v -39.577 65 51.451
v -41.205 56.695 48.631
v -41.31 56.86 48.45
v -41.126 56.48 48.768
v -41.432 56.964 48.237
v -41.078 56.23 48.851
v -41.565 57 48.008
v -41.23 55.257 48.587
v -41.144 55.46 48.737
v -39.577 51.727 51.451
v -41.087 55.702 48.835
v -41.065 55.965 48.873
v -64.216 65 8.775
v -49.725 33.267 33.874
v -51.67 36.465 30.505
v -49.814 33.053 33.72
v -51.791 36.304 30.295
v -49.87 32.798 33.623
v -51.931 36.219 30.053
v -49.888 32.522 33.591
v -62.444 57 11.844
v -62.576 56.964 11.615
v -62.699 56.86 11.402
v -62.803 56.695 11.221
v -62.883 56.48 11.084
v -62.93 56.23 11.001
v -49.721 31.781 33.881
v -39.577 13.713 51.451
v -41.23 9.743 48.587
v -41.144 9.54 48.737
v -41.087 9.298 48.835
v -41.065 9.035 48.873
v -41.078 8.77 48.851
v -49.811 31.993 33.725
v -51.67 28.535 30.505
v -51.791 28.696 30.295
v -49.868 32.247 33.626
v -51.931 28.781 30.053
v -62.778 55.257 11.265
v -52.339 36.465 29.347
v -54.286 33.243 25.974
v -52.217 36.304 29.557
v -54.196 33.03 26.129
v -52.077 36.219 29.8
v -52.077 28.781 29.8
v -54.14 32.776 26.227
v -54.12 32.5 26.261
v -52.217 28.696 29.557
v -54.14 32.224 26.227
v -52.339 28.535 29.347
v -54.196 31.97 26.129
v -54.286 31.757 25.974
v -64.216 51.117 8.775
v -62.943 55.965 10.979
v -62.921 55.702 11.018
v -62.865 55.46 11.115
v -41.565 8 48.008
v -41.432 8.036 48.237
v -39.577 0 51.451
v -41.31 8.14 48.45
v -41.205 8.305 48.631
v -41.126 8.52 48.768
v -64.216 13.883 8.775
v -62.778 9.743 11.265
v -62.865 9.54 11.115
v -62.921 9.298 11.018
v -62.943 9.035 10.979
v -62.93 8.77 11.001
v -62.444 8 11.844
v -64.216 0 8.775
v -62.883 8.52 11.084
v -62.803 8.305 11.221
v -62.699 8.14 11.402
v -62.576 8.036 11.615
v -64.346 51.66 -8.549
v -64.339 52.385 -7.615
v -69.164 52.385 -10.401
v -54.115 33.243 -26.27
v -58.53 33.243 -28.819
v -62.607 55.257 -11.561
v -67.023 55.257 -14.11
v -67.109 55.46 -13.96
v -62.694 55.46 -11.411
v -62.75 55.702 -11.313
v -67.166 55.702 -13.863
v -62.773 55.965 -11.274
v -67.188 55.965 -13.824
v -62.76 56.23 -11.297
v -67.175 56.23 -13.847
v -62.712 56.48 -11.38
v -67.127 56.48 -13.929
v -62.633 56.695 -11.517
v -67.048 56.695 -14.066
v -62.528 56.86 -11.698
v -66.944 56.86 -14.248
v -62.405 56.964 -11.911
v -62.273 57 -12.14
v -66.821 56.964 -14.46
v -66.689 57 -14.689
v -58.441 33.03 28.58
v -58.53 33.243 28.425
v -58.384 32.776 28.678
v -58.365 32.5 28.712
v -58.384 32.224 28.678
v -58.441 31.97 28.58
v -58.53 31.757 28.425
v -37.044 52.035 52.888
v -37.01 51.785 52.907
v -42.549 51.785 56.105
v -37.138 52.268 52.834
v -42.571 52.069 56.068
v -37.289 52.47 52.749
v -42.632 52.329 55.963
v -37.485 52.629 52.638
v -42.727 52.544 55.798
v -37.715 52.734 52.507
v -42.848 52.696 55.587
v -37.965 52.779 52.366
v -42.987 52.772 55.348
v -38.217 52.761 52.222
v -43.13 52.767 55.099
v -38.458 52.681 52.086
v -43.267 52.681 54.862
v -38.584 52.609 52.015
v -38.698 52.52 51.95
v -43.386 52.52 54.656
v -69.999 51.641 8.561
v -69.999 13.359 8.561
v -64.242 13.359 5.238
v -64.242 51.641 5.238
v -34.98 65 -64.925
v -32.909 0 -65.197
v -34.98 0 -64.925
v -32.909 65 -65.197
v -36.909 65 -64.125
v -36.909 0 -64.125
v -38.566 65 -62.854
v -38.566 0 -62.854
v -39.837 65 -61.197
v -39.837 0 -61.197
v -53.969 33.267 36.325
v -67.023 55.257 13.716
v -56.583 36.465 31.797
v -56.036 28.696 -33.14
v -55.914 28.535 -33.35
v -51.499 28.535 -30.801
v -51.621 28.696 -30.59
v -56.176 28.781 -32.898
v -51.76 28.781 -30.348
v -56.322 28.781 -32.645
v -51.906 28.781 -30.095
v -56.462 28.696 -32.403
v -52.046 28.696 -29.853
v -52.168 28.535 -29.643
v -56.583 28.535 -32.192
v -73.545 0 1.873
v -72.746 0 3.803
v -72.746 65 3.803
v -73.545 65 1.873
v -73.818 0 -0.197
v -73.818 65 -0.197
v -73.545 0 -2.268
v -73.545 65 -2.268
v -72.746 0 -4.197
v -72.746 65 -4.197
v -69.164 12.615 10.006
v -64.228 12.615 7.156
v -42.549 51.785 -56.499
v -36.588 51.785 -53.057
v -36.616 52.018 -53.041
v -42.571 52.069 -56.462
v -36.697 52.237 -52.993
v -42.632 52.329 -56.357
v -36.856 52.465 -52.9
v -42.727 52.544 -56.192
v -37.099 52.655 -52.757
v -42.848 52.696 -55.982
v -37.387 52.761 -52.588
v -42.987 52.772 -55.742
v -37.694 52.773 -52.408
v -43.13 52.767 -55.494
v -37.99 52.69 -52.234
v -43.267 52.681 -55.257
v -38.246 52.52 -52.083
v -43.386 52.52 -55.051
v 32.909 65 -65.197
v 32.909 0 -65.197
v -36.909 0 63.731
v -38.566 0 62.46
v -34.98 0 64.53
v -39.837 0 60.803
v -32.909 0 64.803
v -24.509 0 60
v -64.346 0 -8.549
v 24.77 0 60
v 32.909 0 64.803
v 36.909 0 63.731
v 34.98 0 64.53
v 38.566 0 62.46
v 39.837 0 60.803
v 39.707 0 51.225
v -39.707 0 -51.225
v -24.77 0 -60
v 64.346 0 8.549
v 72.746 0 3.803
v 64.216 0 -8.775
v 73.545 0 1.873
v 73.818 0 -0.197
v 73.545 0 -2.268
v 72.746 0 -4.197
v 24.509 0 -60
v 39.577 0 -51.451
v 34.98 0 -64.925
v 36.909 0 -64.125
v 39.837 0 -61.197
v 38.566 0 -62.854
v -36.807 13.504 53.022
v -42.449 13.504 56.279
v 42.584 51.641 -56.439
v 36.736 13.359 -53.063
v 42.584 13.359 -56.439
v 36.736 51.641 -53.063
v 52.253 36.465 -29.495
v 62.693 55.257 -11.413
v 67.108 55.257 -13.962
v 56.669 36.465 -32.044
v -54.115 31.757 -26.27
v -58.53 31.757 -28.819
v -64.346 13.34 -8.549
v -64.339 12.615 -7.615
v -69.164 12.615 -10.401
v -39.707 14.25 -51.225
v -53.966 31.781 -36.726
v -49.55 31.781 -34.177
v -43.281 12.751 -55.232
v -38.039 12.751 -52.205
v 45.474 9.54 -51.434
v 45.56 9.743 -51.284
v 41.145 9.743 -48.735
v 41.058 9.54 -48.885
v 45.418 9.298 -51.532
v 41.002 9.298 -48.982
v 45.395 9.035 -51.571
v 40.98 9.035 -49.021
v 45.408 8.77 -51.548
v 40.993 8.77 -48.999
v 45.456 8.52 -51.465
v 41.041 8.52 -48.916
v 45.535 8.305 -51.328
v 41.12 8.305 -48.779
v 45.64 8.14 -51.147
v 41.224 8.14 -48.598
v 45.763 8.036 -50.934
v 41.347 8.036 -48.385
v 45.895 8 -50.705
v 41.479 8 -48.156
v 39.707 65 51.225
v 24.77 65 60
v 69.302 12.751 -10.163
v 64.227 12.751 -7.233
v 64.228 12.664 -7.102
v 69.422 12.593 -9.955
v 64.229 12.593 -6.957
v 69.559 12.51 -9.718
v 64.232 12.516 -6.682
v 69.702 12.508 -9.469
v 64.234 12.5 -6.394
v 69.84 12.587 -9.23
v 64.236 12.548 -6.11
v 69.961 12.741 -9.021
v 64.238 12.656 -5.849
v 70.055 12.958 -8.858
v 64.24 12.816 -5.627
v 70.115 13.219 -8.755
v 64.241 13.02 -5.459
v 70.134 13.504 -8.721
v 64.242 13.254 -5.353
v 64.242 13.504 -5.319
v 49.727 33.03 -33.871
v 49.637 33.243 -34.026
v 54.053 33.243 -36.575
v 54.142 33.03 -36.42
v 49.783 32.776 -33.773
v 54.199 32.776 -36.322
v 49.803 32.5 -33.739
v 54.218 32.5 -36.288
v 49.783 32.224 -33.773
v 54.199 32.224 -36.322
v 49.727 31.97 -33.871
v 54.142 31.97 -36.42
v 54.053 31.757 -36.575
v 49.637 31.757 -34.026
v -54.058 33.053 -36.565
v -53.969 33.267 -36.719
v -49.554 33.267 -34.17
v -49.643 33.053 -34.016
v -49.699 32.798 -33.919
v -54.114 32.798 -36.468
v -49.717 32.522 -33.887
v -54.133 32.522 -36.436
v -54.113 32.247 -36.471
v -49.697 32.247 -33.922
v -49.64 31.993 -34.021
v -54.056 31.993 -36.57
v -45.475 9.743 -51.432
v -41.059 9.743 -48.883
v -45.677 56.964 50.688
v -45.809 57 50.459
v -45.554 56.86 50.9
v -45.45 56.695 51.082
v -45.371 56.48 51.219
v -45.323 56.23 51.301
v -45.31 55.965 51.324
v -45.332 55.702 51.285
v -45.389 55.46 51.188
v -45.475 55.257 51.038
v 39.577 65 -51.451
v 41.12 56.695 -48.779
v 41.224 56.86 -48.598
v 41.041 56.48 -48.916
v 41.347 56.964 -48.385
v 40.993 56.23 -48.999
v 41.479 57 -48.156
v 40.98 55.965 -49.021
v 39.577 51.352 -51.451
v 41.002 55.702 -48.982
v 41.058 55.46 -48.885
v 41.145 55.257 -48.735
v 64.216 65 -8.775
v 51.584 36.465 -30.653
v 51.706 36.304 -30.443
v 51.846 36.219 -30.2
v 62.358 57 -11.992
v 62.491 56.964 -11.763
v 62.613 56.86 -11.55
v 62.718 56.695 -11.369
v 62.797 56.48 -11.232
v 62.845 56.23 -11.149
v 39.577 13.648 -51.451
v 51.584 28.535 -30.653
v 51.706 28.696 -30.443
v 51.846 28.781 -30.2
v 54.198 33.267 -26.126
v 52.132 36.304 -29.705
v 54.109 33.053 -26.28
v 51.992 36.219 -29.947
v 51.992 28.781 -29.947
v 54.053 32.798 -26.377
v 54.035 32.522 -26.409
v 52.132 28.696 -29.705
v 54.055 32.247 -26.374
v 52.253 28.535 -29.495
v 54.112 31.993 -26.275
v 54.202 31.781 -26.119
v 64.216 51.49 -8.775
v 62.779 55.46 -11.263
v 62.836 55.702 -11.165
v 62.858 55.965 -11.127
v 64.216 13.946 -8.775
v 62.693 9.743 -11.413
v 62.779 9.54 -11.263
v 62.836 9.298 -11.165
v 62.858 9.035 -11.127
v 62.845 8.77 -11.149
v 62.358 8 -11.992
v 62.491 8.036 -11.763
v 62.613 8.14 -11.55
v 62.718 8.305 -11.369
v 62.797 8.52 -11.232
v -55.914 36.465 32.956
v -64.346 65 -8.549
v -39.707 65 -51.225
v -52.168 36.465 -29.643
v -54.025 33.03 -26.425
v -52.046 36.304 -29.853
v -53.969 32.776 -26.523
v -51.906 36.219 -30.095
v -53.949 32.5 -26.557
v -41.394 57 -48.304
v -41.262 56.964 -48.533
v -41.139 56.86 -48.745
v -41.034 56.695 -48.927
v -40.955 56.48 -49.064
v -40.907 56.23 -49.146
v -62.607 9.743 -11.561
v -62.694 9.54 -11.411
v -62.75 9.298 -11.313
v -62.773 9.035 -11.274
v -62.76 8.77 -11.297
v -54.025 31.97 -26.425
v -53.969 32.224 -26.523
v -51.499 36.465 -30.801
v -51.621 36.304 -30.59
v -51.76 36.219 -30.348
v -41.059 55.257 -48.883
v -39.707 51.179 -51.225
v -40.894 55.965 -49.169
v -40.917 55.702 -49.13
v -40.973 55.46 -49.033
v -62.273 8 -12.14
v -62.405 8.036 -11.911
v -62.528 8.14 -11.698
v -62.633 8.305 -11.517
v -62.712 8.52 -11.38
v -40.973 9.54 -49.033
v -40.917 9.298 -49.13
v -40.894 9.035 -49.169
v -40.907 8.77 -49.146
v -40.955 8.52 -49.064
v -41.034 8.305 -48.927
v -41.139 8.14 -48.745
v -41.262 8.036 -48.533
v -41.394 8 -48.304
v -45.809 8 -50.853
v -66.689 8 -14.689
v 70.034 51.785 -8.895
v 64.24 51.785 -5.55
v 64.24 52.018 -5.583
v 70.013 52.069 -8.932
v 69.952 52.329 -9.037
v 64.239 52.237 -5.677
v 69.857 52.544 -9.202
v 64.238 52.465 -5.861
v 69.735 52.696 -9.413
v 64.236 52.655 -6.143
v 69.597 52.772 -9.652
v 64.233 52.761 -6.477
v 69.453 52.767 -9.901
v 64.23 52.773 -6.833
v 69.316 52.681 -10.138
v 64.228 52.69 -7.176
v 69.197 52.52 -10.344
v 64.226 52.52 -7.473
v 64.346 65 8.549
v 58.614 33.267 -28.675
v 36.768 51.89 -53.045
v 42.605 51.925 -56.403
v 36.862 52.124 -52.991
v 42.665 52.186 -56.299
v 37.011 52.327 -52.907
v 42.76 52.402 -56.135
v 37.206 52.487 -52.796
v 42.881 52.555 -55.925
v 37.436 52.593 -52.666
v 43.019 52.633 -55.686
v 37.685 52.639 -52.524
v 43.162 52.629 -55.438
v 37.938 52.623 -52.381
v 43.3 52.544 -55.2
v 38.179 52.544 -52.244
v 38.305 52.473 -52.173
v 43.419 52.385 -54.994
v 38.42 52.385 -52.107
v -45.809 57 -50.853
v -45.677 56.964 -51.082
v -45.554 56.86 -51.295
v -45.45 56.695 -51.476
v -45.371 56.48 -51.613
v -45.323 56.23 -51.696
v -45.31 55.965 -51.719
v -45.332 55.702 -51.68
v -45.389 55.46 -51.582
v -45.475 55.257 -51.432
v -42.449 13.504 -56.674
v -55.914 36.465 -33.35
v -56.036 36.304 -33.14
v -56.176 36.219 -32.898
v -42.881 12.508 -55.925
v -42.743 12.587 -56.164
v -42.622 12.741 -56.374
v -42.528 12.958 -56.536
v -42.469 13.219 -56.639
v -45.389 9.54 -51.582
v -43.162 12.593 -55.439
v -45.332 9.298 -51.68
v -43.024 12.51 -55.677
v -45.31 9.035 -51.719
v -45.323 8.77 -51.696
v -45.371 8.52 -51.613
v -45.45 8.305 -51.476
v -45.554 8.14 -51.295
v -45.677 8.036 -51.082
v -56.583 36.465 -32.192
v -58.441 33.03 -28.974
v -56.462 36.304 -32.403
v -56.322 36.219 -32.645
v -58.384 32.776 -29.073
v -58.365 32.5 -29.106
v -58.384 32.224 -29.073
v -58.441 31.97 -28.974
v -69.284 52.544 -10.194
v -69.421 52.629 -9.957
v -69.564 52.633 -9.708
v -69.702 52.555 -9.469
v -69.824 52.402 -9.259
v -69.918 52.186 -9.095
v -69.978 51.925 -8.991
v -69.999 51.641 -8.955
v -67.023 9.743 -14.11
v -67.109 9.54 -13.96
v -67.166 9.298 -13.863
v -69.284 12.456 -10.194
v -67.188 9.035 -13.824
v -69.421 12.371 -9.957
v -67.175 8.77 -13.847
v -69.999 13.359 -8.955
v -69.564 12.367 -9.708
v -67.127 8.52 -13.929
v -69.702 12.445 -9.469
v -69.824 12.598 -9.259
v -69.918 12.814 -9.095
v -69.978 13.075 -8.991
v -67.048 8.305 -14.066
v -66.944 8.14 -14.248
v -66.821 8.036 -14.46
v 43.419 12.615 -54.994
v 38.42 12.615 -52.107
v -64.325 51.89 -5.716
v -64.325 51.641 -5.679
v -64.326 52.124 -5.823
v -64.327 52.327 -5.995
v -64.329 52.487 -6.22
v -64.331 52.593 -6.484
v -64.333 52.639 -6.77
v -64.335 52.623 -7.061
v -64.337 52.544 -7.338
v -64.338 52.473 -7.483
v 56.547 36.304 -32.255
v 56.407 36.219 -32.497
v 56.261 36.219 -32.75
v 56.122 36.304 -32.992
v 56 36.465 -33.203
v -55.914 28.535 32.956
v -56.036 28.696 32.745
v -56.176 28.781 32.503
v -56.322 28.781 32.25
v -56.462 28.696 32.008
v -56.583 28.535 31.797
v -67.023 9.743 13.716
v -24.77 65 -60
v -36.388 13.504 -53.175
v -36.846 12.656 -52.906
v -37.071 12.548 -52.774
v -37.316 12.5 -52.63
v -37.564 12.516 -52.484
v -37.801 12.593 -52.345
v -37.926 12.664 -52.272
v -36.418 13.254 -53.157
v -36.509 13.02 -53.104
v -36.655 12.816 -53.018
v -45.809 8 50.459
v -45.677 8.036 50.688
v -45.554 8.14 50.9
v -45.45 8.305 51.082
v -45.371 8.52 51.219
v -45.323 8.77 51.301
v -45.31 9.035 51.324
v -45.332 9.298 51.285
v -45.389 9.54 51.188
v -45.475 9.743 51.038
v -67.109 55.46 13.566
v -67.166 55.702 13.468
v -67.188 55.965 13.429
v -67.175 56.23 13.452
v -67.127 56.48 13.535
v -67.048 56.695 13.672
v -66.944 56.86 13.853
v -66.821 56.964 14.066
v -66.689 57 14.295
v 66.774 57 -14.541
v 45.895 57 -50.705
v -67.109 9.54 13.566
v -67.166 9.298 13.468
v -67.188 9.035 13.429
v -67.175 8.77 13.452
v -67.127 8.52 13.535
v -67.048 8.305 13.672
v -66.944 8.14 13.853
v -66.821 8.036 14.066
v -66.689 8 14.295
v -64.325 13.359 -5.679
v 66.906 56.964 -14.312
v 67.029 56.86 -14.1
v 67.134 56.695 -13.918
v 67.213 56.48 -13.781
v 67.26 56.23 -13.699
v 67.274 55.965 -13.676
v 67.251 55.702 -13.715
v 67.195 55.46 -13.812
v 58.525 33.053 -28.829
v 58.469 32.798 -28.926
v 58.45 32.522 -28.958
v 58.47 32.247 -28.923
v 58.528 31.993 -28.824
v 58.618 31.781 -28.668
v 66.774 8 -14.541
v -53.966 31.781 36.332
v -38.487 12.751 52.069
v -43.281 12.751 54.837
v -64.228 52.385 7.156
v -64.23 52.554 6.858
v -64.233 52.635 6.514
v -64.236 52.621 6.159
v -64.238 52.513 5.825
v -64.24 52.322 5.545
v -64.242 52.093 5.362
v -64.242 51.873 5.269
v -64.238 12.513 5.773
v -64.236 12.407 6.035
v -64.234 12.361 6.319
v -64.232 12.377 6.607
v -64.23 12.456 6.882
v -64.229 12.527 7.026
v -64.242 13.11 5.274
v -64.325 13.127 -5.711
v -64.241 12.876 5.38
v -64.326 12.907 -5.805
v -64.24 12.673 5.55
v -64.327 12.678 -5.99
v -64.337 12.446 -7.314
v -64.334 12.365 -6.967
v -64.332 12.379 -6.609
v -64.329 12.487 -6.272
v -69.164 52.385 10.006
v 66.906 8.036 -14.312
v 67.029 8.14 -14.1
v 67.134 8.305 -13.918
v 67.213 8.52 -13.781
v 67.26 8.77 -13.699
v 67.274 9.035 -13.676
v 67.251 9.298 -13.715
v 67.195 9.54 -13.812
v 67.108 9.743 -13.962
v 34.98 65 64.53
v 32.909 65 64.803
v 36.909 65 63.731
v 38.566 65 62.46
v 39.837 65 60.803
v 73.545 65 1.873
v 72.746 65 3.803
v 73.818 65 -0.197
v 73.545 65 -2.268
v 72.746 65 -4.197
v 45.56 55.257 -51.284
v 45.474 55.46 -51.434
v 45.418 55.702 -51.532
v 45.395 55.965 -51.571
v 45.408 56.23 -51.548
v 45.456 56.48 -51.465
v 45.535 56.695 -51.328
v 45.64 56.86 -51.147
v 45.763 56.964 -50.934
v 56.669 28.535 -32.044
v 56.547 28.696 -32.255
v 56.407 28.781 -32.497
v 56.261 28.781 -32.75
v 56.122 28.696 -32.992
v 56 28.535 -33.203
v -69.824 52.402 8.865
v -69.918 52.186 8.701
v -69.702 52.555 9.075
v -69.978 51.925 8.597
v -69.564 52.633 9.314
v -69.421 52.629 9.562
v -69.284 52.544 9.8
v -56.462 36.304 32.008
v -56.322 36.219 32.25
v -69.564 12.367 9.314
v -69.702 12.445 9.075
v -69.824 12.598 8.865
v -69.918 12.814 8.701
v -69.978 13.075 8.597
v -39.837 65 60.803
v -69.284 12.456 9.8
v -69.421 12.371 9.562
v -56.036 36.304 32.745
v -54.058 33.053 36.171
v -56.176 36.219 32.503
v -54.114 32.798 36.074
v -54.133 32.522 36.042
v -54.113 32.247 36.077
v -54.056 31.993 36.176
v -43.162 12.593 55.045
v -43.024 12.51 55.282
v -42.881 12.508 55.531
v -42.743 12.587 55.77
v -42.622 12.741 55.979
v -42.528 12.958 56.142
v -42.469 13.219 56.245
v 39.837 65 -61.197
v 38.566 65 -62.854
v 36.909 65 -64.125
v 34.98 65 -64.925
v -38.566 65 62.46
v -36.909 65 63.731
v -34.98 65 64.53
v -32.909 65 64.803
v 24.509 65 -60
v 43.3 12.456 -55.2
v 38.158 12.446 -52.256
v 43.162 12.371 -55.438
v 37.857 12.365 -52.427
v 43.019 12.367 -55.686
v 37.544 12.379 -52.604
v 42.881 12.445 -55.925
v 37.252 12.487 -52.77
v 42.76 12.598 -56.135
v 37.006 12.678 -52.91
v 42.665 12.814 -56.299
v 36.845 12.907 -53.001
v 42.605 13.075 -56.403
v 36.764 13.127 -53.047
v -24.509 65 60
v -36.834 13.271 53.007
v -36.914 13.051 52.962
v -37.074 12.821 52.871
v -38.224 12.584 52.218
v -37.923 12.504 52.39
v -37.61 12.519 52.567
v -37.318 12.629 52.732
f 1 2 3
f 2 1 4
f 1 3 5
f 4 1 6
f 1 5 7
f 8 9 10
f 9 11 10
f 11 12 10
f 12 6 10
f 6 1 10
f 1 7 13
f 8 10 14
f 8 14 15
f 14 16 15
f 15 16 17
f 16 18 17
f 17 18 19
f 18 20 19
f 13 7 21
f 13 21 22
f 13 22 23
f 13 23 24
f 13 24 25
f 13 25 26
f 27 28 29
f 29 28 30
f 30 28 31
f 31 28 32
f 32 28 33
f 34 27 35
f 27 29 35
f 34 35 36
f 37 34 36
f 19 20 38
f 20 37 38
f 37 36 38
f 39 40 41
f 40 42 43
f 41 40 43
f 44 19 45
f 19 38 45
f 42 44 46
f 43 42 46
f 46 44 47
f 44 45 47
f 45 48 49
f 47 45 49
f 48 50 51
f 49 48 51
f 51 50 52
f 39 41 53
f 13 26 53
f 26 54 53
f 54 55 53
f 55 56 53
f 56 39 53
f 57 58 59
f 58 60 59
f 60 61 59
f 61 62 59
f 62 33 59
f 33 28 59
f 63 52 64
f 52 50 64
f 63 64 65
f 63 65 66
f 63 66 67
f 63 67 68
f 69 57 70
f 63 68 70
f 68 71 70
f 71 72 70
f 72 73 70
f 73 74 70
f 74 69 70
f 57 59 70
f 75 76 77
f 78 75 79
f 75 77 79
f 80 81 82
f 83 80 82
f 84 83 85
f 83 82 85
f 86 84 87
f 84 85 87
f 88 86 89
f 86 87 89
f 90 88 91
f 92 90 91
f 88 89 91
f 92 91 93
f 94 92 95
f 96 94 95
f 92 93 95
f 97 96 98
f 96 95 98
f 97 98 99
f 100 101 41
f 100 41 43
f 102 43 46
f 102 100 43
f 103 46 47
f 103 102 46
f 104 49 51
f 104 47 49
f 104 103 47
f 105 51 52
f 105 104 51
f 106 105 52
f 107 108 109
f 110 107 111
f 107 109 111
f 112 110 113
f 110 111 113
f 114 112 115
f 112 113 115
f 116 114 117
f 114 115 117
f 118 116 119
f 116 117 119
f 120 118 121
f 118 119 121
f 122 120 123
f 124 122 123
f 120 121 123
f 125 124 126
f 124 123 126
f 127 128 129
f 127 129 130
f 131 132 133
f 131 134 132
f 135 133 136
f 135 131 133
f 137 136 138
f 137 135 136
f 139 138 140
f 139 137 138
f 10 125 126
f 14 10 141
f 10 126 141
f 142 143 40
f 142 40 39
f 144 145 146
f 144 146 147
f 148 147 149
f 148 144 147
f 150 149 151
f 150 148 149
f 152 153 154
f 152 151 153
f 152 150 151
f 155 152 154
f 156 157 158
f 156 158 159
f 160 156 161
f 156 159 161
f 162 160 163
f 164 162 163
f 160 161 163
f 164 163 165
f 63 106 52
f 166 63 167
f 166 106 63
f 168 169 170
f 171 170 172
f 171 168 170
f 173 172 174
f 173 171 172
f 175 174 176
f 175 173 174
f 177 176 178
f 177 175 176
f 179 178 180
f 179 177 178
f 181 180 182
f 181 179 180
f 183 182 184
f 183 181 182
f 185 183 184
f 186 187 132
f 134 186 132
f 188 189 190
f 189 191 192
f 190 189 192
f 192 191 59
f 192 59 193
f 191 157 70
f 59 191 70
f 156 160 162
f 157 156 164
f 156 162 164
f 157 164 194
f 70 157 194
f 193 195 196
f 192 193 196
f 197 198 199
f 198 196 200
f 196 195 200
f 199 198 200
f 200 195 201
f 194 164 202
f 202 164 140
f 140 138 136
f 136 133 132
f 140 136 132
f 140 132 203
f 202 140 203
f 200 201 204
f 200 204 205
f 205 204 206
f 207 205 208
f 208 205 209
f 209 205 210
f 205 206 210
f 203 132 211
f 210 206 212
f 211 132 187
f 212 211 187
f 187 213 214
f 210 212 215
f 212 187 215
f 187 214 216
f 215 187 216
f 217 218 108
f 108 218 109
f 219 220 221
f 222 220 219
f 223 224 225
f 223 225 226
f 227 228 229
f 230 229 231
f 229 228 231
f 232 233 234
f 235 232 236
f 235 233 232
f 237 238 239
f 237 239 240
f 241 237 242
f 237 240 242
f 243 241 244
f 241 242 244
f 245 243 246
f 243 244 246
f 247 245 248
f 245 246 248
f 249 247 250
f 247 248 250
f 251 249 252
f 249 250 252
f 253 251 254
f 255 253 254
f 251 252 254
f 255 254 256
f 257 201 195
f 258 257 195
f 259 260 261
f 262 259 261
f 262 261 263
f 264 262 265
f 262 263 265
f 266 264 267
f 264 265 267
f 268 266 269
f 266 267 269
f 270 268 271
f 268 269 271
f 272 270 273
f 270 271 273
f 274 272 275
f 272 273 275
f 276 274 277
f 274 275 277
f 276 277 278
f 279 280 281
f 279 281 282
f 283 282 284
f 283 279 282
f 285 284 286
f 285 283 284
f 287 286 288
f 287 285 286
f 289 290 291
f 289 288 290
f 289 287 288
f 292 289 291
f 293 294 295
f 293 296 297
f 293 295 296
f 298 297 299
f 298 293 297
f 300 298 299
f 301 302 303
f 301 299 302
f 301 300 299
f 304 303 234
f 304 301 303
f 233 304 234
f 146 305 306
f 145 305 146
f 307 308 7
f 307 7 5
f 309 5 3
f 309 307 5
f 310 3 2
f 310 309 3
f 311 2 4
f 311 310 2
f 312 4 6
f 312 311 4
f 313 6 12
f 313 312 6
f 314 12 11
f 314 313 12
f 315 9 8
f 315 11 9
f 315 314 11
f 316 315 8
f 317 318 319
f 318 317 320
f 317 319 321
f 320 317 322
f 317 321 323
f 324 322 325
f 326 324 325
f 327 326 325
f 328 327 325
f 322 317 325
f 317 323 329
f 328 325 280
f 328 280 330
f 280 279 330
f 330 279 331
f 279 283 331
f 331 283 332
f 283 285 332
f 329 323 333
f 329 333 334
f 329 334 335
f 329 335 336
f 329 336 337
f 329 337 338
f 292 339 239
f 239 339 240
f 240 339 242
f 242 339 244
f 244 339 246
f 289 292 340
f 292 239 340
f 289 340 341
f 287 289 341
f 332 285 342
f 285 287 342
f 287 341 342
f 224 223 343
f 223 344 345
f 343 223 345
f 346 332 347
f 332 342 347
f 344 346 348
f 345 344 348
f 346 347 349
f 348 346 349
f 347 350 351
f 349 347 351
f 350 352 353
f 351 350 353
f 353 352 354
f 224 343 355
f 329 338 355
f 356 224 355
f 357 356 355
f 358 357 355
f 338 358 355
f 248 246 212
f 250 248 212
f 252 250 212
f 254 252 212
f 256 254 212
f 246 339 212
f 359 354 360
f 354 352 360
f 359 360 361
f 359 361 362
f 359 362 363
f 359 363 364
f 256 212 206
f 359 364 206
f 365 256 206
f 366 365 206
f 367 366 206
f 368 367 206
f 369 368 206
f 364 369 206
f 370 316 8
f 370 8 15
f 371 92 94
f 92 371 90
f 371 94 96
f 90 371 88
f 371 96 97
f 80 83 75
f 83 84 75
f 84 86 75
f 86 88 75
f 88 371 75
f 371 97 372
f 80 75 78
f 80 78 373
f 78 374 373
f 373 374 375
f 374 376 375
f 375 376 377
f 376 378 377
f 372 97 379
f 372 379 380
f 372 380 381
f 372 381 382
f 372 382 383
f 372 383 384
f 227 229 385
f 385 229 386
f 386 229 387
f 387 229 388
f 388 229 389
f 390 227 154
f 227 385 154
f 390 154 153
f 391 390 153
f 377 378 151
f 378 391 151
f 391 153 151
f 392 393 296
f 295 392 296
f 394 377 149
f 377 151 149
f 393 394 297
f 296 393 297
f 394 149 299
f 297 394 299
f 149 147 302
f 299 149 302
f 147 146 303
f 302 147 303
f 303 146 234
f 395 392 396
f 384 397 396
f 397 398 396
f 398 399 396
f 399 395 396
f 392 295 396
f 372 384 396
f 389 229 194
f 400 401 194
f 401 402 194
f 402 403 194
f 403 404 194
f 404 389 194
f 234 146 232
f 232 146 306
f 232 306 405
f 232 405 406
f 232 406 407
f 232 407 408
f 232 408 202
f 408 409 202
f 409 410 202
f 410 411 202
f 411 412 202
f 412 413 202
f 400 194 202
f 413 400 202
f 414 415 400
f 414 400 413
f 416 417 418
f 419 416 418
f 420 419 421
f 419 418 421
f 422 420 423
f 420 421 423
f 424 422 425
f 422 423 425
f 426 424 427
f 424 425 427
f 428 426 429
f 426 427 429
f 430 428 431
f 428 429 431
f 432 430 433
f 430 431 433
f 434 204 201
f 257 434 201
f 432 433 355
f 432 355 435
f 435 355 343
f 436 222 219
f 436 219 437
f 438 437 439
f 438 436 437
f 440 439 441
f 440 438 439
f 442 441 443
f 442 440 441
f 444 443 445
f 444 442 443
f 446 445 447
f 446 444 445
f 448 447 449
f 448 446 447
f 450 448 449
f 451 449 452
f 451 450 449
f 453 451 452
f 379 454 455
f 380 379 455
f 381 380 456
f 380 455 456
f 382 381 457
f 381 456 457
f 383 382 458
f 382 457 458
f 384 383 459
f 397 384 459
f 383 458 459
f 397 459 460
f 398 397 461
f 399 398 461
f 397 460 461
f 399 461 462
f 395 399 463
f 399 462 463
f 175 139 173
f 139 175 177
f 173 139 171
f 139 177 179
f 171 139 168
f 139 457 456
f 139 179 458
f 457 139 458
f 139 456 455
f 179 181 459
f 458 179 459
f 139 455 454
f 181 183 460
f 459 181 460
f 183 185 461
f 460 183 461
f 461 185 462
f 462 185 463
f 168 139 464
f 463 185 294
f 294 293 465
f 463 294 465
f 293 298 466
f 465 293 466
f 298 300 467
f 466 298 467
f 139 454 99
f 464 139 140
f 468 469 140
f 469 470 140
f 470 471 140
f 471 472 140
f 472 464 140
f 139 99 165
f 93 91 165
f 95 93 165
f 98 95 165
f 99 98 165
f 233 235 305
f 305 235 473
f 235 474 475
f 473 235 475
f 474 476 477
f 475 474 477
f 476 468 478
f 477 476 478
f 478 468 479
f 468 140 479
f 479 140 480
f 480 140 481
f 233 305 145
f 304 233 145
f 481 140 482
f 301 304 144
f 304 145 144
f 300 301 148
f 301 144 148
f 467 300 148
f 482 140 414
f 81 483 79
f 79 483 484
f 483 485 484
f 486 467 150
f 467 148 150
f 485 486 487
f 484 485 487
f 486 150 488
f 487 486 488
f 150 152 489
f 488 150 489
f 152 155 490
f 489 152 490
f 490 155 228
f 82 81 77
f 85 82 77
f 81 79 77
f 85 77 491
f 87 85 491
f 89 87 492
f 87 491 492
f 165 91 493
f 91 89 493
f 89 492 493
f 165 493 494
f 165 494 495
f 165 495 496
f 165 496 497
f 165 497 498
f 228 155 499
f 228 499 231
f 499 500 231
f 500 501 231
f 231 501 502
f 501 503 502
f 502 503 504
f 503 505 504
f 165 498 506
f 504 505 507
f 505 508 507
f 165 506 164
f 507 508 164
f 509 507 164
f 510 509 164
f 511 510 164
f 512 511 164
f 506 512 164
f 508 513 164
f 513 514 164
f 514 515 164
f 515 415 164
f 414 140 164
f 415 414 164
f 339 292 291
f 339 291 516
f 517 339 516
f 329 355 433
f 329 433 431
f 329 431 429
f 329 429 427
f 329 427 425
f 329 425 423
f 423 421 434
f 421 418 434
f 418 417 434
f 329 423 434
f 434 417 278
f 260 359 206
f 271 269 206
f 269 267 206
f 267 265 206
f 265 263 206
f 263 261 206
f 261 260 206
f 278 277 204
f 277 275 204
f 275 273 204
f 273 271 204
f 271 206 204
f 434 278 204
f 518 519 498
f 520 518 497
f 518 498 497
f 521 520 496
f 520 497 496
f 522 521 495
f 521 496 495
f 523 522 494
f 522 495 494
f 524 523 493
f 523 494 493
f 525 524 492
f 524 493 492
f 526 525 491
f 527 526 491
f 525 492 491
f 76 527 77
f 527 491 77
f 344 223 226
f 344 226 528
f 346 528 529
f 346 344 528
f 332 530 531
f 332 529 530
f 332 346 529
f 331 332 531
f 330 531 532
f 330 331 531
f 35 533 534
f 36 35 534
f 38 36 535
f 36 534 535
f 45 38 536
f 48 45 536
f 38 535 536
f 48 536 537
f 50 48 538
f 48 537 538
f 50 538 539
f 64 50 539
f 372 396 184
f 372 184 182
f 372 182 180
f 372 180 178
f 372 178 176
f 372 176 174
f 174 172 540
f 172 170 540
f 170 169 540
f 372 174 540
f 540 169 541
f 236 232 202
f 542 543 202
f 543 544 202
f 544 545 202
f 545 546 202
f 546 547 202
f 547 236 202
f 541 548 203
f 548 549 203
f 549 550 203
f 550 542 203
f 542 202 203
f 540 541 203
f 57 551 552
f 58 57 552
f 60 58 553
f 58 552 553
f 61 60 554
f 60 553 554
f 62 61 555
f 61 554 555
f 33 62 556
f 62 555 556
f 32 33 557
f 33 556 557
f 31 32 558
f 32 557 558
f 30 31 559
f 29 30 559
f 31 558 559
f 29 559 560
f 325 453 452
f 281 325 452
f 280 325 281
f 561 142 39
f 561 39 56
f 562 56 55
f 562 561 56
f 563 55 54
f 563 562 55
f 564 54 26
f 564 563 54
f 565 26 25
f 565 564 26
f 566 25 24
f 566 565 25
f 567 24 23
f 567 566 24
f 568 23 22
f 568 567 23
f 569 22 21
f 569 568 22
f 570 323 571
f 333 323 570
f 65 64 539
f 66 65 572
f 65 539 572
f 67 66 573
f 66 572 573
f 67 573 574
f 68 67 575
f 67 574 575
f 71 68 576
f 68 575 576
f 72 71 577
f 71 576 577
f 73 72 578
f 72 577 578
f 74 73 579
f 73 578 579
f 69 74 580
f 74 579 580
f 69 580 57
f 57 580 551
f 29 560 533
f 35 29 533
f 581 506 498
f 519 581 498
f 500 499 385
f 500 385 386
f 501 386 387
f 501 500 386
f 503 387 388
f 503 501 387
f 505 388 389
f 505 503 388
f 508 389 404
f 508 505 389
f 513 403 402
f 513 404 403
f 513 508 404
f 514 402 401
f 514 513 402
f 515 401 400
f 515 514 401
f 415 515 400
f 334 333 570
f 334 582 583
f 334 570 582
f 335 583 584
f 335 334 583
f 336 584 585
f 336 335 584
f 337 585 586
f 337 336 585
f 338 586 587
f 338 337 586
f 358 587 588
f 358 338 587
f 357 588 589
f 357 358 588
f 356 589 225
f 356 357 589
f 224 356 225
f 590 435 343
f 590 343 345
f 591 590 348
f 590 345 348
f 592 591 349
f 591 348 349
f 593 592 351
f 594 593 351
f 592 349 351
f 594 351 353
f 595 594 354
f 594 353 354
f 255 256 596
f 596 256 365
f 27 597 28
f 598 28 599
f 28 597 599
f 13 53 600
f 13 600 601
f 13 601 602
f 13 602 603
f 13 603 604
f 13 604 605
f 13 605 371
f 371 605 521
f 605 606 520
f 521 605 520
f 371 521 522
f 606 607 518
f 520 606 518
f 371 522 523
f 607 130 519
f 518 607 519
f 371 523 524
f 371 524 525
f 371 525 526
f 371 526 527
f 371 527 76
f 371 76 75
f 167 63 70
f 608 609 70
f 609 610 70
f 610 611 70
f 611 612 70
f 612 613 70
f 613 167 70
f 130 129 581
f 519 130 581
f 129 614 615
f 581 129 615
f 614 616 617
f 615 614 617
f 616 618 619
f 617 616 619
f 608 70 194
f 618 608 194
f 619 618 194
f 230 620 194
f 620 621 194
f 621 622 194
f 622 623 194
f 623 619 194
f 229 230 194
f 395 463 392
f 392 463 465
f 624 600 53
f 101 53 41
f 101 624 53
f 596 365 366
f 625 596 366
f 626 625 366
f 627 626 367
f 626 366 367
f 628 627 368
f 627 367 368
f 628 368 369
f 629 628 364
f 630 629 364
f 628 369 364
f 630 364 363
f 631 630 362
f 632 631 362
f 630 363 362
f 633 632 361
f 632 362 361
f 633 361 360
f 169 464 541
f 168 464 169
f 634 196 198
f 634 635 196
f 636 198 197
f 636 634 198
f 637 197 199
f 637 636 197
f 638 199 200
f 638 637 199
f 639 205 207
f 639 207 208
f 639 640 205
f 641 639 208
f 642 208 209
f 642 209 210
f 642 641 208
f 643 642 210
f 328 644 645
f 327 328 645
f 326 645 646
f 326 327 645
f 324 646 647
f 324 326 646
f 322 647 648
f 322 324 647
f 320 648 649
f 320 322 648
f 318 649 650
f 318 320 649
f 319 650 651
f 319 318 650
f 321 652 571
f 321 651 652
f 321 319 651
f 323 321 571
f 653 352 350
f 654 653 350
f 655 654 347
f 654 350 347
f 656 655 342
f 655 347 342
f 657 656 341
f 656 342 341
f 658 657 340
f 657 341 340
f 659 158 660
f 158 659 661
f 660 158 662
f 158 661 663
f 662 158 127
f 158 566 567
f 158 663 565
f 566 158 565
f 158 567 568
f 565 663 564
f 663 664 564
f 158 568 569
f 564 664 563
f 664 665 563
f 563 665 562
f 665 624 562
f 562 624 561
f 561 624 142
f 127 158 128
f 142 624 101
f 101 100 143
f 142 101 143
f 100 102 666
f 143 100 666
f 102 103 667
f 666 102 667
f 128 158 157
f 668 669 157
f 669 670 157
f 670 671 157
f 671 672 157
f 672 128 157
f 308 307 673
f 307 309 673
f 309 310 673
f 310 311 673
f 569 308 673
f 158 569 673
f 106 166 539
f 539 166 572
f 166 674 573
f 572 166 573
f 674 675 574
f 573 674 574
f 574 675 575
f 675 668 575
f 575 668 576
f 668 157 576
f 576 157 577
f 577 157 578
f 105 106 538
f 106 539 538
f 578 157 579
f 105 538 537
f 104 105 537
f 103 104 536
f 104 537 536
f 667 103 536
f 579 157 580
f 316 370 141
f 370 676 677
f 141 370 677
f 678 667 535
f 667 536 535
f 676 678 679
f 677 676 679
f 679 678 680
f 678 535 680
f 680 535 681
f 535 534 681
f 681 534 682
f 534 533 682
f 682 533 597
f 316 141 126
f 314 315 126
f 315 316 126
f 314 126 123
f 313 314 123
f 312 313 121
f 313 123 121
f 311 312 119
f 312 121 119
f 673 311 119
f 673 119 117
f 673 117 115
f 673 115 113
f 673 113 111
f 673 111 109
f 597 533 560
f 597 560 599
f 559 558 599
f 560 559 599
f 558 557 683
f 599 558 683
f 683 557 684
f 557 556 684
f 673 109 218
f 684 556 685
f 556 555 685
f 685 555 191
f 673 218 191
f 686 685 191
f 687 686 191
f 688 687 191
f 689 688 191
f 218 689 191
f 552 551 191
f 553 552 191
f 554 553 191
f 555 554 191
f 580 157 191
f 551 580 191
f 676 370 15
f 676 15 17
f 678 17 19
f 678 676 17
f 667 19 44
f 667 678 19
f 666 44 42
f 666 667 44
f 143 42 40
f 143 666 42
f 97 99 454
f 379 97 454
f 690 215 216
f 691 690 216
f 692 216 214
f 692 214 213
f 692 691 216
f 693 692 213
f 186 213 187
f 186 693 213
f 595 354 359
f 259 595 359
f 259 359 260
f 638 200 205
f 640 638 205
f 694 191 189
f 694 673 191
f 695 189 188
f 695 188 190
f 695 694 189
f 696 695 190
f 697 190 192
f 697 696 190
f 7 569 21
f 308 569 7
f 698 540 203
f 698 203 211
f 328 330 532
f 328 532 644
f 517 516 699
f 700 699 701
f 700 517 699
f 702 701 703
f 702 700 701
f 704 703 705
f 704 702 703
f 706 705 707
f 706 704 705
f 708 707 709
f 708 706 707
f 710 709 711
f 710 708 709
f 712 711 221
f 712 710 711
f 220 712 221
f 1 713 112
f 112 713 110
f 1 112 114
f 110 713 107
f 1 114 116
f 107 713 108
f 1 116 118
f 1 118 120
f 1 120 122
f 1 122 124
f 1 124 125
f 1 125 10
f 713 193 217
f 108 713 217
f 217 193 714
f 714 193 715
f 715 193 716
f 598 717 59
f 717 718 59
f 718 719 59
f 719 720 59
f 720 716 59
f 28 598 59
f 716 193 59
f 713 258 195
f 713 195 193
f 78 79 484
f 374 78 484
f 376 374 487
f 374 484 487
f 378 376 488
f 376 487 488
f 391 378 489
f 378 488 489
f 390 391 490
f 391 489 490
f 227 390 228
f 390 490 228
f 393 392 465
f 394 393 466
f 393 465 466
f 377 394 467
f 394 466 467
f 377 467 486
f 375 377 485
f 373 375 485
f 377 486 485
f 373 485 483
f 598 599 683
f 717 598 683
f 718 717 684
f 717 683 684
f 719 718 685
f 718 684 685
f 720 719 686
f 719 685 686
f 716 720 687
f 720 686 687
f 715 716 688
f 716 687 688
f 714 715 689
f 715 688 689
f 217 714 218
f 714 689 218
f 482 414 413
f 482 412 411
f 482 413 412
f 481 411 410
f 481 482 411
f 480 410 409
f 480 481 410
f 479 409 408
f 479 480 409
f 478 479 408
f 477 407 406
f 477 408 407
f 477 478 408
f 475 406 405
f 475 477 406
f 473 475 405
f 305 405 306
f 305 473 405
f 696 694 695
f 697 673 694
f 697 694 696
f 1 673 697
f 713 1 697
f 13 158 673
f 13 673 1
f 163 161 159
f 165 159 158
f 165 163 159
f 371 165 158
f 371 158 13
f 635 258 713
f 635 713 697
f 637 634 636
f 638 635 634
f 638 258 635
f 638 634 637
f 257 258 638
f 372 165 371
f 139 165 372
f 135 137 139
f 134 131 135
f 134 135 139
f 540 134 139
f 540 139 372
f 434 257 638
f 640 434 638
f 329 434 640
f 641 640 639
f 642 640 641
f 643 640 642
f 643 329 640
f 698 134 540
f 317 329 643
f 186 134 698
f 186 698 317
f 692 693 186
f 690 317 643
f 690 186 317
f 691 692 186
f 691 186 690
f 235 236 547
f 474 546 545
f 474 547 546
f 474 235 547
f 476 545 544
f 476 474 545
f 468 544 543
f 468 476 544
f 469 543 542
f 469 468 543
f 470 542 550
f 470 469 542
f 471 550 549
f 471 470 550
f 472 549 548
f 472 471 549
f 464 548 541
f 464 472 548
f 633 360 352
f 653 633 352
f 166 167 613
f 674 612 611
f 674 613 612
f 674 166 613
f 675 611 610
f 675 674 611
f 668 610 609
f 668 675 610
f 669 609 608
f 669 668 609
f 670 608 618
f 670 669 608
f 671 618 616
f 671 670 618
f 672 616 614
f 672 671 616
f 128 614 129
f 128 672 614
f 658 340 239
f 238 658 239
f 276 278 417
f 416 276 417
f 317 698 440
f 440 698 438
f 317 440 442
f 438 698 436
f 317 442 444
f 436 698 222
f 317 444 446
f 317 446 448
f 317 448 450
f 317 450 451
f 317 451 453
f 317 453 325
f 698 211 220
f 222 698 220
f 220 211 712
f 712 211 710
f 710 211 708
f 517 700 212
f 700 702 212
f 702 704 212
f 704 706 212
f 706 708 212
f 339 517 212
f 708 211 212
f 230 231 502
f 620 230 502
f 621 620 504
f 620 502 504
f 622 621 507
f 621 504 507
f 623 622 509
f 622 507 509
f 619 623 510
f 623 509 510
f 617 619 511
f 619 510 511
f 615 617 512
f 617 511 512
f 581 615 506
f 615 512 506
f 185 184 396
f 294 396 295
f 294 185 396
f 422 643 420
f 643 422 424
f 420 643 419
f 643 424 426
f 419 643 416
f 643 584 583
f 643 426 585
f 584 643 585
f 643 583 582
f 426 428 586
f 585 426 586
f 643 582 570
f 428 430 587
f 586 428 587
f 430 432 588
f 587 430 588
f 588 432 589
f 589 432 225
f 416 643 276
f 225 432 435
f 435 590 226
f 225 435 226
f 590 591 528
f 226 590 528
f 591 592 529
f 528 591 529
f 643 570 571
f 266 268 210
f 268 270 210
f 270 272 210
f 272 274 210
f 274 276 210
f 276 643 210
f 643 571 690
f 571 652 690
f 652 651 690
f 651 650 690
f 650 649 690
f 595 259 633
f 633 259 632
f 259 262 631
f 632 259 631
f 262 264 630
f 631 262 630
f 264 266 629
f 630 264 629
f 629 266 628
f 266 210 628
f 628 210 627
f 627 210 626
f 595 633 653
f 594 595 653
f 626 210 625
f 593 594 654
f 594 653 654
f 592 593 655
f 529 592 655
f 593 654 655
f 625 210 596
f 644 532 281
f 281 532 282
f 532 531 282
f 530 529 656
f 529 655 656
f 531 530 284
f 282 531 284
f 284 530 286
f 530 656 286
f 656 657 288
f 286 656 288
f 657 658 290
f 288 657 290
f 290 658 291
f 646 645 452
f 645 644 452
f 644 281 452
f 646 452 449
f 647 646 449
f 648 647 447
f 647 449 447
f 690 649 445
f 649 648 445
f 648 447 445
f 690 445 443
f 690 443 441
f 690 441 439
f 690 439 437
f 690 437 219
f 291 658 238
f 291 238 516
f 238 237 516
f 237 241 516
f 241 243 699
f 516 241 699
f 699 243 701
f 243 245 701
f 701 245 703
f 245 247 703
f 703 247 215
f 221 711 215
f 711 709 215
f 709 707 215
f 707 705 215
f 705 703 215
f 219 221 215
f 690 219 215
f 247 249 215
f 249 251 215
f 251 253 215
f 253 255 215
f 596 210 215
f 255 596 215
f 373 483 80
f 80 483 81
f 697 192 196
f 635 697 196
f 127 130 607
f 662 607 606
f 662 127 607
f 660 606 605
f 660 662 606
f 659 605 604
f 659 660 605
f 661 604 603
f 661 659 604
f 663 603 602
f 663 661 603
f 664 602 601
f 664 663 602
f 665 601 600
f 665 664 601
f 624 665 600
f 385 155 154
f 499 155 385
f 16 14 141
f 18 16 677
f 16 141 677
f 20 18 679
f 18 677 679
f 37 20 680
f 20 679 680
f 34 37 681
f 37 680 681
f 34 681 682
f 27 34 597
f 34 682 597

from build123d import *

# Parameters (mm, degrees)
BOSS_EXTRUDE1_DEPTH = 65
FILLET1_R           = 8
CUT_EXTRUDE1_DEPTH  = 65
CUT_EXTRUDE2_REACH  = 177.118
CUT_EXTRUDE3_DEPTH  = 50


with BuildPart() as part:
    # Sketch1 → Boss-Extrude1 (new body)
    with BuildSketch(Plane(origin=(0, 0, 0), x_dir=(1, 0, 0), z_dir=(0, 1, 0))):
        Polygon((-75.055534995, 0.197193855), (-37.527767497, -64.802806145), (37.527767497, -64.802806145), (75.055534995, 0.197193855), (37.527767497, 65.197193855), (-37.527767497, 65.197193855), align=None)
    extrude(amount=BOSS_EXTRUDE1_DEPTH)

    # Fillet1
    fillet1_edges = [part.edges().sort_by_distance(p)[0] for p in [
        (-37.527767497, 32.5, -65.197193855),
        (37.527767497, 32.5, -65.197193855),
        (75.055534995, 32.5, -0.197193855),
        (37.527767497, 32.5, 64.802806145),
        (-37.527767497, 32.5, 64.802806145),
        (-75.055534995, 32.5, -0.197193855),
    ]]
    fillet(fillet1_edges, radius=FILLET1_R)

    # Sketch2 → Cut-Extrude1 (cut)
    with BuildSketch(Plane(origin=(0, 0, 0), x_dir=(1, 0, 0), z_dir=(0, 1, 0))):
        Polygon((-39.707247658, 51.225029628), (-24.769507731, 60), (24.508553139, 60), (39.576770362, 51.451022934), (64.215800796, 8.774970372), (64.346278093, -8.548977066), (39.707247658, -51.225029628), (24.769507731, -60), (-24.508553139, -60), (-39.576770362, -51.451022934), (-64.215800796, -8.774970372), (-64.346278093, 8.548977066), align=None)
    extrude(amount=CUT_EXTRUDE1_DEPTH, mode=Mode.SUBTRACT)

    # Cut-Extrude2: up to this face of the body (flat: up to its plane)
    cut_extrude2_end = Plane(part.part.faces().sort_by_distance((56.291651246, 32.5, -32.697193855))[0])
    # Sketch4 → Cut-Extrude2 (cut, up to the picked face)
    with BuildSketch(Plane(origin=(-56.206263802, 0, 32.450701536), x_dir=(0.5000000000000002, 0, 0.8660254037844386), z_dir=(-0.8660254037844386, 0, 0.5000000000000002)), mode=Mode.PRIVATE) as cut_extrude2_sk1:
        with BuildLine():
            Line((-4.64838762, 31.756705854), (-25.916422712, 12.61547427))
            ThreePointArc((-25.916422712, 12.61547427), (-26.992226029, 12.445268353), (-27.585387444, 13.358768416))
            Line((-27.585387444, 13.358768416), (-27.585387444, 51.641231584))
            ThreePointArc((-27.585387444, 51.641231584), (-26.992226029, 52.554731647), (-25.916422712, 52.38452573))
            Line((-25.916422712, 52.38452573), (-4.64838762, 33.243294146))
            ThreePointArc((-4.64838762, 33.243294146), (-4.317352351, 32.5), (-4.64838762, 31.756705854))
        make_face()
    cut_extrude2_tool1 = split(extrude(cut_extrude2_sk1.sketch, amount=-CUT_EXTRUDE2_REACH, mode=Mode.PRIVATE), bisect_by=cut_extrude2_end, keep=Keep.BOTH, mode=Mode.PRIVATE)
    # Sketch4 → Cut-Extrude2 (cut, up to the picked face)
    with BuildSketch(Plane(origin=(-56.206263802, 0, 32.450701536), x_dir=(0.5000000000000002, 0, 0.8660254037844386), z_dir=(-0.8660254037844386, 0, 0.5000000000000002)), mode=Mode.PRIVATE) as cut_extrude2_sk2:
        with BuildLine():
            Line((-0.754352176, 36.46547427), (-21.63349838, 55.256705854))
            ThreePointArc((-21.63349838, 55.256705854), (-21.89815406, 56.358263767), (-20.964533648, 57))
            Line((-20.964533648, 57), (20.79375876, 57))
            ThreePointArc((20.79375876, 57), (21.727379172, 56.358263767), (21.462723491, 55.256705854))
            Line((21.462723491, 55.256705854), (0.583577288, 36.46547427))
            ThreePointArc((0.583577288, 36.46547427), (-0.085387444, 36.208768416), (-0.754352176, 36.46547427))
        make_face()
    cut_extrude2_tool2 = split(extrude(cut_extrude2_sk2.sketch, amount=-CUT_EXTRUDE2_REACH, mode=Mode.PRIVATE), bisect_by=cut_extrude2_end, keep=Keep.BOTH, mode=Mode.PRIVATE)
    # Sketch4 → Cut-Extrude2 (cut, up to the picked face)
    with BuildSketch(Plane(origin=(-56.206263802, 0, 32.450701536), x_dir=(0.5000000000000002, 0, 0.8660254037844386), z_dir=(-0.8660254037844386, 0, 0.5000000000000002)), mode=Mode.PRIVATE) as cut_extrude2_sk3:
        with BuildLine():
            Line((21.462723491, 9.743294146), (0.583577288, 28.53452573))
            ThreePointArc((0.583577288, 28.53452573), (-0.085387444, 28.791231584), (-0.754352176, 28.53452573))
            Line((-0.754352176, 28.53452573), (-21.63349838, 9.743294146))
            ThreePointArc((-21.63349838, 9.743294146), (-21.89815406, 8.641736233), (-20.964533648, 8))
            Line((-20.964533648, 8), (20.79375876, 8))
            ThreePointArc((20.79375876, 8), (21.727379172, 8.641736233), (21.462723491, 9.743294146))
        make_face()
    cut_extrude2_tool3 = split(extrude(cut_extrude2_sk3.sketch, amount=-CUT_EXTRUDE2_REACH, mode=Mode.PRIVATE), bisect_by=cut_extrude2_end, keep=Keep.BOTH, mode=Mode.PRIVATE)
    # Sketch4 → Cut-Extrude2 (cut, up to the picked face)
    with BuildSketch(Plane(origin=(-56.206263802, 0, 32.450701536), x_dir=(0.5000000000000002, 0, 0.8660254037844386), z_dir=(-0.8660254037844386, 0, 0.5000000000000002)), mode=Mode.PRIVATE) as cut_extrude2_sk4:
        with BuildLine():
            Line((25.640806472, 52.519982346), (4.473644042, 33.267260514))
            ThreePointArc((4.473644042, 33.267260514), (4.146519039, 32.52223718), (4.481455433, 31.780692745))
            Line((4.481455433, 31.780692745), (25.849775962, 12.751479913))
            ThreePointArc((25.849775962, 12.751479913), (26.926458787, 12.586929236), (27.514811958, 13.503533499))
            Line((27.514811958, 13.503533499), (27.313653858, 51.785468163))
            ThreePointArc((27.313653858, 51.785468163), (26.715700577, 52.695838803), (25.640806472, 52.519982346))
        make_face()
    cut_extrude2_tool4 = split(extrude(cut_extrude2_sk4.sketch, amount=-CUT_EXTRUDE2_REACH, mode=Mode.PRIVATE), bisect_by=cut_extrude2_end, keep=Keep.BOTH, mode=Mode.PRIVATE)
    add(cut_extrude2_tool1.solids().sort_by(Axis((-66.026454, 32.5, 15.441634), (0.8660254037844386, 0, -0.5000000000000002)))[0], mode=Mode.SUBTRACT)
    add(cut_extrude2_tool2.solids().sort_by(Axis((-56.248958, 49.92174, 32.376754), (0.8660254037844386, 0, -0.5000000000000002)))[0], mode=Mode.SUBTRACT)
    add(cut_extrude2_tool3.solids().sort_by(Axis((-56.248958, 15.07826, 32.376754), (0.8660254037844386, 0, -0.5000000000000002)))[0], mode=Mode.SUBTRACT)
    add(cut_extrude2_tool4.solids().sort_by(Axis((-46.471596, 32.602753, 49.31164), (0.8660254037844386, 0, -0.5000000000000002)))[0], mode=Mode.SUBTRACT)

    # Sketch6 → Cut-Extrude3 (cut)
    with BuildSketch(Plane(origin=(-56.206263802, 0, -32.845089247), x_dir=(0.5, 0, -0.8660254037844386), z_dir=(0.8660254037844387, 0, 0.5000000000000001))):
        with BuildLine():
            Line((-4.64838762, 31.756705854), (-25.916422712, 12.61547427))
            ThreePointArc((-25.916422712, 12.61547427), (-26.992226029, 12.445268353), (-27.585387444, 13.358768416))
            Line((-27.585387444, 13.358768416), (-27.585387444, 51.641231584))
            ThreePointArc((-27.585387444, 51.641231584), (-26.992226029, 52.554731647), (-25.916422712, 52.38452573))
            Line((-25.916422712, 52.38452573), (-4.64838762, 33.243294146))
            ThreePointArc((-4.64838762, 33.243294146), (-4.317352351, 32.5), (-4.64838762, 31.756705854))
        make_face()
        with BuildLine():
            Line((-0.754352176, 36.46547427), (-21.63349838, 55.256705854))
            ThreePointArc((-21.63349838, 55.256705854), (-21.89815406, 56.358263767), (-20.964533648, 57))
            Line((-20.964533648, 57), (20.79375876, 57))
            ThreePointArc((20.79375876, 57), (21.727379172, 56.358263767), (21.462723491, 55.256705854))
            Line((21.462723491, 55.256705854), (0.583577288, 36.46547427))
            ThreePointArc((0.583577288, 36.46547427), (-0.085387444, 36.208768416), (-0.754352176, 36.46547427))
        make_face()
        with BuildLine():
            Line((21.462723491, 9.743294146), (0.583577288, 28.53452573))
            ThreePointArc((0.583577288, 28.53452573), (-0.085387444, 28.791231584), (-0.754352176, 28.53452573))
            Line((-0.754352176, 28.53452573), (-21.63349838, 9.743294146))
            ThreePointArc((-21.63349838, 9.743294146), (-21.89815406, 8.641736233), (-20.964533648, 8))
            Line((-20.964533648, 8), (20.79375876, 8))
            ThreePointArc((20.79375876, 8), (21.727379172, 8.641736233), (21.462723491, 9.743294146))
        make_face()
        with BuildLine():
            Line((25.640806472, 52.519982346), (4.473644042, 33.267260514))
            ThreePointArc((4.473644042, 33.267260514), (4.146519039, 32.52223718), (4.481455433, 31.780692745))
            Line((4.481455433, 31.780692745), (25.849775962, 12.751479913))
            ThreePointArc((25.849775962, 12.751479913), (26.926458787, 12.586929236), (27.514811958, 13.503533499))
            Line((27.514811958, 13.503533499), (27.313653858, 51.785468163))
            ThreePointArc((27.313653858, 51.785468163), (26.715700577, 52.695838803), (25.640806472, 52.519982346))
        make_face()
    extrude(amount=CUT_EXTRUDE3_DEPTH, mode=Mode.SUBTRACT)


solid = part.part
